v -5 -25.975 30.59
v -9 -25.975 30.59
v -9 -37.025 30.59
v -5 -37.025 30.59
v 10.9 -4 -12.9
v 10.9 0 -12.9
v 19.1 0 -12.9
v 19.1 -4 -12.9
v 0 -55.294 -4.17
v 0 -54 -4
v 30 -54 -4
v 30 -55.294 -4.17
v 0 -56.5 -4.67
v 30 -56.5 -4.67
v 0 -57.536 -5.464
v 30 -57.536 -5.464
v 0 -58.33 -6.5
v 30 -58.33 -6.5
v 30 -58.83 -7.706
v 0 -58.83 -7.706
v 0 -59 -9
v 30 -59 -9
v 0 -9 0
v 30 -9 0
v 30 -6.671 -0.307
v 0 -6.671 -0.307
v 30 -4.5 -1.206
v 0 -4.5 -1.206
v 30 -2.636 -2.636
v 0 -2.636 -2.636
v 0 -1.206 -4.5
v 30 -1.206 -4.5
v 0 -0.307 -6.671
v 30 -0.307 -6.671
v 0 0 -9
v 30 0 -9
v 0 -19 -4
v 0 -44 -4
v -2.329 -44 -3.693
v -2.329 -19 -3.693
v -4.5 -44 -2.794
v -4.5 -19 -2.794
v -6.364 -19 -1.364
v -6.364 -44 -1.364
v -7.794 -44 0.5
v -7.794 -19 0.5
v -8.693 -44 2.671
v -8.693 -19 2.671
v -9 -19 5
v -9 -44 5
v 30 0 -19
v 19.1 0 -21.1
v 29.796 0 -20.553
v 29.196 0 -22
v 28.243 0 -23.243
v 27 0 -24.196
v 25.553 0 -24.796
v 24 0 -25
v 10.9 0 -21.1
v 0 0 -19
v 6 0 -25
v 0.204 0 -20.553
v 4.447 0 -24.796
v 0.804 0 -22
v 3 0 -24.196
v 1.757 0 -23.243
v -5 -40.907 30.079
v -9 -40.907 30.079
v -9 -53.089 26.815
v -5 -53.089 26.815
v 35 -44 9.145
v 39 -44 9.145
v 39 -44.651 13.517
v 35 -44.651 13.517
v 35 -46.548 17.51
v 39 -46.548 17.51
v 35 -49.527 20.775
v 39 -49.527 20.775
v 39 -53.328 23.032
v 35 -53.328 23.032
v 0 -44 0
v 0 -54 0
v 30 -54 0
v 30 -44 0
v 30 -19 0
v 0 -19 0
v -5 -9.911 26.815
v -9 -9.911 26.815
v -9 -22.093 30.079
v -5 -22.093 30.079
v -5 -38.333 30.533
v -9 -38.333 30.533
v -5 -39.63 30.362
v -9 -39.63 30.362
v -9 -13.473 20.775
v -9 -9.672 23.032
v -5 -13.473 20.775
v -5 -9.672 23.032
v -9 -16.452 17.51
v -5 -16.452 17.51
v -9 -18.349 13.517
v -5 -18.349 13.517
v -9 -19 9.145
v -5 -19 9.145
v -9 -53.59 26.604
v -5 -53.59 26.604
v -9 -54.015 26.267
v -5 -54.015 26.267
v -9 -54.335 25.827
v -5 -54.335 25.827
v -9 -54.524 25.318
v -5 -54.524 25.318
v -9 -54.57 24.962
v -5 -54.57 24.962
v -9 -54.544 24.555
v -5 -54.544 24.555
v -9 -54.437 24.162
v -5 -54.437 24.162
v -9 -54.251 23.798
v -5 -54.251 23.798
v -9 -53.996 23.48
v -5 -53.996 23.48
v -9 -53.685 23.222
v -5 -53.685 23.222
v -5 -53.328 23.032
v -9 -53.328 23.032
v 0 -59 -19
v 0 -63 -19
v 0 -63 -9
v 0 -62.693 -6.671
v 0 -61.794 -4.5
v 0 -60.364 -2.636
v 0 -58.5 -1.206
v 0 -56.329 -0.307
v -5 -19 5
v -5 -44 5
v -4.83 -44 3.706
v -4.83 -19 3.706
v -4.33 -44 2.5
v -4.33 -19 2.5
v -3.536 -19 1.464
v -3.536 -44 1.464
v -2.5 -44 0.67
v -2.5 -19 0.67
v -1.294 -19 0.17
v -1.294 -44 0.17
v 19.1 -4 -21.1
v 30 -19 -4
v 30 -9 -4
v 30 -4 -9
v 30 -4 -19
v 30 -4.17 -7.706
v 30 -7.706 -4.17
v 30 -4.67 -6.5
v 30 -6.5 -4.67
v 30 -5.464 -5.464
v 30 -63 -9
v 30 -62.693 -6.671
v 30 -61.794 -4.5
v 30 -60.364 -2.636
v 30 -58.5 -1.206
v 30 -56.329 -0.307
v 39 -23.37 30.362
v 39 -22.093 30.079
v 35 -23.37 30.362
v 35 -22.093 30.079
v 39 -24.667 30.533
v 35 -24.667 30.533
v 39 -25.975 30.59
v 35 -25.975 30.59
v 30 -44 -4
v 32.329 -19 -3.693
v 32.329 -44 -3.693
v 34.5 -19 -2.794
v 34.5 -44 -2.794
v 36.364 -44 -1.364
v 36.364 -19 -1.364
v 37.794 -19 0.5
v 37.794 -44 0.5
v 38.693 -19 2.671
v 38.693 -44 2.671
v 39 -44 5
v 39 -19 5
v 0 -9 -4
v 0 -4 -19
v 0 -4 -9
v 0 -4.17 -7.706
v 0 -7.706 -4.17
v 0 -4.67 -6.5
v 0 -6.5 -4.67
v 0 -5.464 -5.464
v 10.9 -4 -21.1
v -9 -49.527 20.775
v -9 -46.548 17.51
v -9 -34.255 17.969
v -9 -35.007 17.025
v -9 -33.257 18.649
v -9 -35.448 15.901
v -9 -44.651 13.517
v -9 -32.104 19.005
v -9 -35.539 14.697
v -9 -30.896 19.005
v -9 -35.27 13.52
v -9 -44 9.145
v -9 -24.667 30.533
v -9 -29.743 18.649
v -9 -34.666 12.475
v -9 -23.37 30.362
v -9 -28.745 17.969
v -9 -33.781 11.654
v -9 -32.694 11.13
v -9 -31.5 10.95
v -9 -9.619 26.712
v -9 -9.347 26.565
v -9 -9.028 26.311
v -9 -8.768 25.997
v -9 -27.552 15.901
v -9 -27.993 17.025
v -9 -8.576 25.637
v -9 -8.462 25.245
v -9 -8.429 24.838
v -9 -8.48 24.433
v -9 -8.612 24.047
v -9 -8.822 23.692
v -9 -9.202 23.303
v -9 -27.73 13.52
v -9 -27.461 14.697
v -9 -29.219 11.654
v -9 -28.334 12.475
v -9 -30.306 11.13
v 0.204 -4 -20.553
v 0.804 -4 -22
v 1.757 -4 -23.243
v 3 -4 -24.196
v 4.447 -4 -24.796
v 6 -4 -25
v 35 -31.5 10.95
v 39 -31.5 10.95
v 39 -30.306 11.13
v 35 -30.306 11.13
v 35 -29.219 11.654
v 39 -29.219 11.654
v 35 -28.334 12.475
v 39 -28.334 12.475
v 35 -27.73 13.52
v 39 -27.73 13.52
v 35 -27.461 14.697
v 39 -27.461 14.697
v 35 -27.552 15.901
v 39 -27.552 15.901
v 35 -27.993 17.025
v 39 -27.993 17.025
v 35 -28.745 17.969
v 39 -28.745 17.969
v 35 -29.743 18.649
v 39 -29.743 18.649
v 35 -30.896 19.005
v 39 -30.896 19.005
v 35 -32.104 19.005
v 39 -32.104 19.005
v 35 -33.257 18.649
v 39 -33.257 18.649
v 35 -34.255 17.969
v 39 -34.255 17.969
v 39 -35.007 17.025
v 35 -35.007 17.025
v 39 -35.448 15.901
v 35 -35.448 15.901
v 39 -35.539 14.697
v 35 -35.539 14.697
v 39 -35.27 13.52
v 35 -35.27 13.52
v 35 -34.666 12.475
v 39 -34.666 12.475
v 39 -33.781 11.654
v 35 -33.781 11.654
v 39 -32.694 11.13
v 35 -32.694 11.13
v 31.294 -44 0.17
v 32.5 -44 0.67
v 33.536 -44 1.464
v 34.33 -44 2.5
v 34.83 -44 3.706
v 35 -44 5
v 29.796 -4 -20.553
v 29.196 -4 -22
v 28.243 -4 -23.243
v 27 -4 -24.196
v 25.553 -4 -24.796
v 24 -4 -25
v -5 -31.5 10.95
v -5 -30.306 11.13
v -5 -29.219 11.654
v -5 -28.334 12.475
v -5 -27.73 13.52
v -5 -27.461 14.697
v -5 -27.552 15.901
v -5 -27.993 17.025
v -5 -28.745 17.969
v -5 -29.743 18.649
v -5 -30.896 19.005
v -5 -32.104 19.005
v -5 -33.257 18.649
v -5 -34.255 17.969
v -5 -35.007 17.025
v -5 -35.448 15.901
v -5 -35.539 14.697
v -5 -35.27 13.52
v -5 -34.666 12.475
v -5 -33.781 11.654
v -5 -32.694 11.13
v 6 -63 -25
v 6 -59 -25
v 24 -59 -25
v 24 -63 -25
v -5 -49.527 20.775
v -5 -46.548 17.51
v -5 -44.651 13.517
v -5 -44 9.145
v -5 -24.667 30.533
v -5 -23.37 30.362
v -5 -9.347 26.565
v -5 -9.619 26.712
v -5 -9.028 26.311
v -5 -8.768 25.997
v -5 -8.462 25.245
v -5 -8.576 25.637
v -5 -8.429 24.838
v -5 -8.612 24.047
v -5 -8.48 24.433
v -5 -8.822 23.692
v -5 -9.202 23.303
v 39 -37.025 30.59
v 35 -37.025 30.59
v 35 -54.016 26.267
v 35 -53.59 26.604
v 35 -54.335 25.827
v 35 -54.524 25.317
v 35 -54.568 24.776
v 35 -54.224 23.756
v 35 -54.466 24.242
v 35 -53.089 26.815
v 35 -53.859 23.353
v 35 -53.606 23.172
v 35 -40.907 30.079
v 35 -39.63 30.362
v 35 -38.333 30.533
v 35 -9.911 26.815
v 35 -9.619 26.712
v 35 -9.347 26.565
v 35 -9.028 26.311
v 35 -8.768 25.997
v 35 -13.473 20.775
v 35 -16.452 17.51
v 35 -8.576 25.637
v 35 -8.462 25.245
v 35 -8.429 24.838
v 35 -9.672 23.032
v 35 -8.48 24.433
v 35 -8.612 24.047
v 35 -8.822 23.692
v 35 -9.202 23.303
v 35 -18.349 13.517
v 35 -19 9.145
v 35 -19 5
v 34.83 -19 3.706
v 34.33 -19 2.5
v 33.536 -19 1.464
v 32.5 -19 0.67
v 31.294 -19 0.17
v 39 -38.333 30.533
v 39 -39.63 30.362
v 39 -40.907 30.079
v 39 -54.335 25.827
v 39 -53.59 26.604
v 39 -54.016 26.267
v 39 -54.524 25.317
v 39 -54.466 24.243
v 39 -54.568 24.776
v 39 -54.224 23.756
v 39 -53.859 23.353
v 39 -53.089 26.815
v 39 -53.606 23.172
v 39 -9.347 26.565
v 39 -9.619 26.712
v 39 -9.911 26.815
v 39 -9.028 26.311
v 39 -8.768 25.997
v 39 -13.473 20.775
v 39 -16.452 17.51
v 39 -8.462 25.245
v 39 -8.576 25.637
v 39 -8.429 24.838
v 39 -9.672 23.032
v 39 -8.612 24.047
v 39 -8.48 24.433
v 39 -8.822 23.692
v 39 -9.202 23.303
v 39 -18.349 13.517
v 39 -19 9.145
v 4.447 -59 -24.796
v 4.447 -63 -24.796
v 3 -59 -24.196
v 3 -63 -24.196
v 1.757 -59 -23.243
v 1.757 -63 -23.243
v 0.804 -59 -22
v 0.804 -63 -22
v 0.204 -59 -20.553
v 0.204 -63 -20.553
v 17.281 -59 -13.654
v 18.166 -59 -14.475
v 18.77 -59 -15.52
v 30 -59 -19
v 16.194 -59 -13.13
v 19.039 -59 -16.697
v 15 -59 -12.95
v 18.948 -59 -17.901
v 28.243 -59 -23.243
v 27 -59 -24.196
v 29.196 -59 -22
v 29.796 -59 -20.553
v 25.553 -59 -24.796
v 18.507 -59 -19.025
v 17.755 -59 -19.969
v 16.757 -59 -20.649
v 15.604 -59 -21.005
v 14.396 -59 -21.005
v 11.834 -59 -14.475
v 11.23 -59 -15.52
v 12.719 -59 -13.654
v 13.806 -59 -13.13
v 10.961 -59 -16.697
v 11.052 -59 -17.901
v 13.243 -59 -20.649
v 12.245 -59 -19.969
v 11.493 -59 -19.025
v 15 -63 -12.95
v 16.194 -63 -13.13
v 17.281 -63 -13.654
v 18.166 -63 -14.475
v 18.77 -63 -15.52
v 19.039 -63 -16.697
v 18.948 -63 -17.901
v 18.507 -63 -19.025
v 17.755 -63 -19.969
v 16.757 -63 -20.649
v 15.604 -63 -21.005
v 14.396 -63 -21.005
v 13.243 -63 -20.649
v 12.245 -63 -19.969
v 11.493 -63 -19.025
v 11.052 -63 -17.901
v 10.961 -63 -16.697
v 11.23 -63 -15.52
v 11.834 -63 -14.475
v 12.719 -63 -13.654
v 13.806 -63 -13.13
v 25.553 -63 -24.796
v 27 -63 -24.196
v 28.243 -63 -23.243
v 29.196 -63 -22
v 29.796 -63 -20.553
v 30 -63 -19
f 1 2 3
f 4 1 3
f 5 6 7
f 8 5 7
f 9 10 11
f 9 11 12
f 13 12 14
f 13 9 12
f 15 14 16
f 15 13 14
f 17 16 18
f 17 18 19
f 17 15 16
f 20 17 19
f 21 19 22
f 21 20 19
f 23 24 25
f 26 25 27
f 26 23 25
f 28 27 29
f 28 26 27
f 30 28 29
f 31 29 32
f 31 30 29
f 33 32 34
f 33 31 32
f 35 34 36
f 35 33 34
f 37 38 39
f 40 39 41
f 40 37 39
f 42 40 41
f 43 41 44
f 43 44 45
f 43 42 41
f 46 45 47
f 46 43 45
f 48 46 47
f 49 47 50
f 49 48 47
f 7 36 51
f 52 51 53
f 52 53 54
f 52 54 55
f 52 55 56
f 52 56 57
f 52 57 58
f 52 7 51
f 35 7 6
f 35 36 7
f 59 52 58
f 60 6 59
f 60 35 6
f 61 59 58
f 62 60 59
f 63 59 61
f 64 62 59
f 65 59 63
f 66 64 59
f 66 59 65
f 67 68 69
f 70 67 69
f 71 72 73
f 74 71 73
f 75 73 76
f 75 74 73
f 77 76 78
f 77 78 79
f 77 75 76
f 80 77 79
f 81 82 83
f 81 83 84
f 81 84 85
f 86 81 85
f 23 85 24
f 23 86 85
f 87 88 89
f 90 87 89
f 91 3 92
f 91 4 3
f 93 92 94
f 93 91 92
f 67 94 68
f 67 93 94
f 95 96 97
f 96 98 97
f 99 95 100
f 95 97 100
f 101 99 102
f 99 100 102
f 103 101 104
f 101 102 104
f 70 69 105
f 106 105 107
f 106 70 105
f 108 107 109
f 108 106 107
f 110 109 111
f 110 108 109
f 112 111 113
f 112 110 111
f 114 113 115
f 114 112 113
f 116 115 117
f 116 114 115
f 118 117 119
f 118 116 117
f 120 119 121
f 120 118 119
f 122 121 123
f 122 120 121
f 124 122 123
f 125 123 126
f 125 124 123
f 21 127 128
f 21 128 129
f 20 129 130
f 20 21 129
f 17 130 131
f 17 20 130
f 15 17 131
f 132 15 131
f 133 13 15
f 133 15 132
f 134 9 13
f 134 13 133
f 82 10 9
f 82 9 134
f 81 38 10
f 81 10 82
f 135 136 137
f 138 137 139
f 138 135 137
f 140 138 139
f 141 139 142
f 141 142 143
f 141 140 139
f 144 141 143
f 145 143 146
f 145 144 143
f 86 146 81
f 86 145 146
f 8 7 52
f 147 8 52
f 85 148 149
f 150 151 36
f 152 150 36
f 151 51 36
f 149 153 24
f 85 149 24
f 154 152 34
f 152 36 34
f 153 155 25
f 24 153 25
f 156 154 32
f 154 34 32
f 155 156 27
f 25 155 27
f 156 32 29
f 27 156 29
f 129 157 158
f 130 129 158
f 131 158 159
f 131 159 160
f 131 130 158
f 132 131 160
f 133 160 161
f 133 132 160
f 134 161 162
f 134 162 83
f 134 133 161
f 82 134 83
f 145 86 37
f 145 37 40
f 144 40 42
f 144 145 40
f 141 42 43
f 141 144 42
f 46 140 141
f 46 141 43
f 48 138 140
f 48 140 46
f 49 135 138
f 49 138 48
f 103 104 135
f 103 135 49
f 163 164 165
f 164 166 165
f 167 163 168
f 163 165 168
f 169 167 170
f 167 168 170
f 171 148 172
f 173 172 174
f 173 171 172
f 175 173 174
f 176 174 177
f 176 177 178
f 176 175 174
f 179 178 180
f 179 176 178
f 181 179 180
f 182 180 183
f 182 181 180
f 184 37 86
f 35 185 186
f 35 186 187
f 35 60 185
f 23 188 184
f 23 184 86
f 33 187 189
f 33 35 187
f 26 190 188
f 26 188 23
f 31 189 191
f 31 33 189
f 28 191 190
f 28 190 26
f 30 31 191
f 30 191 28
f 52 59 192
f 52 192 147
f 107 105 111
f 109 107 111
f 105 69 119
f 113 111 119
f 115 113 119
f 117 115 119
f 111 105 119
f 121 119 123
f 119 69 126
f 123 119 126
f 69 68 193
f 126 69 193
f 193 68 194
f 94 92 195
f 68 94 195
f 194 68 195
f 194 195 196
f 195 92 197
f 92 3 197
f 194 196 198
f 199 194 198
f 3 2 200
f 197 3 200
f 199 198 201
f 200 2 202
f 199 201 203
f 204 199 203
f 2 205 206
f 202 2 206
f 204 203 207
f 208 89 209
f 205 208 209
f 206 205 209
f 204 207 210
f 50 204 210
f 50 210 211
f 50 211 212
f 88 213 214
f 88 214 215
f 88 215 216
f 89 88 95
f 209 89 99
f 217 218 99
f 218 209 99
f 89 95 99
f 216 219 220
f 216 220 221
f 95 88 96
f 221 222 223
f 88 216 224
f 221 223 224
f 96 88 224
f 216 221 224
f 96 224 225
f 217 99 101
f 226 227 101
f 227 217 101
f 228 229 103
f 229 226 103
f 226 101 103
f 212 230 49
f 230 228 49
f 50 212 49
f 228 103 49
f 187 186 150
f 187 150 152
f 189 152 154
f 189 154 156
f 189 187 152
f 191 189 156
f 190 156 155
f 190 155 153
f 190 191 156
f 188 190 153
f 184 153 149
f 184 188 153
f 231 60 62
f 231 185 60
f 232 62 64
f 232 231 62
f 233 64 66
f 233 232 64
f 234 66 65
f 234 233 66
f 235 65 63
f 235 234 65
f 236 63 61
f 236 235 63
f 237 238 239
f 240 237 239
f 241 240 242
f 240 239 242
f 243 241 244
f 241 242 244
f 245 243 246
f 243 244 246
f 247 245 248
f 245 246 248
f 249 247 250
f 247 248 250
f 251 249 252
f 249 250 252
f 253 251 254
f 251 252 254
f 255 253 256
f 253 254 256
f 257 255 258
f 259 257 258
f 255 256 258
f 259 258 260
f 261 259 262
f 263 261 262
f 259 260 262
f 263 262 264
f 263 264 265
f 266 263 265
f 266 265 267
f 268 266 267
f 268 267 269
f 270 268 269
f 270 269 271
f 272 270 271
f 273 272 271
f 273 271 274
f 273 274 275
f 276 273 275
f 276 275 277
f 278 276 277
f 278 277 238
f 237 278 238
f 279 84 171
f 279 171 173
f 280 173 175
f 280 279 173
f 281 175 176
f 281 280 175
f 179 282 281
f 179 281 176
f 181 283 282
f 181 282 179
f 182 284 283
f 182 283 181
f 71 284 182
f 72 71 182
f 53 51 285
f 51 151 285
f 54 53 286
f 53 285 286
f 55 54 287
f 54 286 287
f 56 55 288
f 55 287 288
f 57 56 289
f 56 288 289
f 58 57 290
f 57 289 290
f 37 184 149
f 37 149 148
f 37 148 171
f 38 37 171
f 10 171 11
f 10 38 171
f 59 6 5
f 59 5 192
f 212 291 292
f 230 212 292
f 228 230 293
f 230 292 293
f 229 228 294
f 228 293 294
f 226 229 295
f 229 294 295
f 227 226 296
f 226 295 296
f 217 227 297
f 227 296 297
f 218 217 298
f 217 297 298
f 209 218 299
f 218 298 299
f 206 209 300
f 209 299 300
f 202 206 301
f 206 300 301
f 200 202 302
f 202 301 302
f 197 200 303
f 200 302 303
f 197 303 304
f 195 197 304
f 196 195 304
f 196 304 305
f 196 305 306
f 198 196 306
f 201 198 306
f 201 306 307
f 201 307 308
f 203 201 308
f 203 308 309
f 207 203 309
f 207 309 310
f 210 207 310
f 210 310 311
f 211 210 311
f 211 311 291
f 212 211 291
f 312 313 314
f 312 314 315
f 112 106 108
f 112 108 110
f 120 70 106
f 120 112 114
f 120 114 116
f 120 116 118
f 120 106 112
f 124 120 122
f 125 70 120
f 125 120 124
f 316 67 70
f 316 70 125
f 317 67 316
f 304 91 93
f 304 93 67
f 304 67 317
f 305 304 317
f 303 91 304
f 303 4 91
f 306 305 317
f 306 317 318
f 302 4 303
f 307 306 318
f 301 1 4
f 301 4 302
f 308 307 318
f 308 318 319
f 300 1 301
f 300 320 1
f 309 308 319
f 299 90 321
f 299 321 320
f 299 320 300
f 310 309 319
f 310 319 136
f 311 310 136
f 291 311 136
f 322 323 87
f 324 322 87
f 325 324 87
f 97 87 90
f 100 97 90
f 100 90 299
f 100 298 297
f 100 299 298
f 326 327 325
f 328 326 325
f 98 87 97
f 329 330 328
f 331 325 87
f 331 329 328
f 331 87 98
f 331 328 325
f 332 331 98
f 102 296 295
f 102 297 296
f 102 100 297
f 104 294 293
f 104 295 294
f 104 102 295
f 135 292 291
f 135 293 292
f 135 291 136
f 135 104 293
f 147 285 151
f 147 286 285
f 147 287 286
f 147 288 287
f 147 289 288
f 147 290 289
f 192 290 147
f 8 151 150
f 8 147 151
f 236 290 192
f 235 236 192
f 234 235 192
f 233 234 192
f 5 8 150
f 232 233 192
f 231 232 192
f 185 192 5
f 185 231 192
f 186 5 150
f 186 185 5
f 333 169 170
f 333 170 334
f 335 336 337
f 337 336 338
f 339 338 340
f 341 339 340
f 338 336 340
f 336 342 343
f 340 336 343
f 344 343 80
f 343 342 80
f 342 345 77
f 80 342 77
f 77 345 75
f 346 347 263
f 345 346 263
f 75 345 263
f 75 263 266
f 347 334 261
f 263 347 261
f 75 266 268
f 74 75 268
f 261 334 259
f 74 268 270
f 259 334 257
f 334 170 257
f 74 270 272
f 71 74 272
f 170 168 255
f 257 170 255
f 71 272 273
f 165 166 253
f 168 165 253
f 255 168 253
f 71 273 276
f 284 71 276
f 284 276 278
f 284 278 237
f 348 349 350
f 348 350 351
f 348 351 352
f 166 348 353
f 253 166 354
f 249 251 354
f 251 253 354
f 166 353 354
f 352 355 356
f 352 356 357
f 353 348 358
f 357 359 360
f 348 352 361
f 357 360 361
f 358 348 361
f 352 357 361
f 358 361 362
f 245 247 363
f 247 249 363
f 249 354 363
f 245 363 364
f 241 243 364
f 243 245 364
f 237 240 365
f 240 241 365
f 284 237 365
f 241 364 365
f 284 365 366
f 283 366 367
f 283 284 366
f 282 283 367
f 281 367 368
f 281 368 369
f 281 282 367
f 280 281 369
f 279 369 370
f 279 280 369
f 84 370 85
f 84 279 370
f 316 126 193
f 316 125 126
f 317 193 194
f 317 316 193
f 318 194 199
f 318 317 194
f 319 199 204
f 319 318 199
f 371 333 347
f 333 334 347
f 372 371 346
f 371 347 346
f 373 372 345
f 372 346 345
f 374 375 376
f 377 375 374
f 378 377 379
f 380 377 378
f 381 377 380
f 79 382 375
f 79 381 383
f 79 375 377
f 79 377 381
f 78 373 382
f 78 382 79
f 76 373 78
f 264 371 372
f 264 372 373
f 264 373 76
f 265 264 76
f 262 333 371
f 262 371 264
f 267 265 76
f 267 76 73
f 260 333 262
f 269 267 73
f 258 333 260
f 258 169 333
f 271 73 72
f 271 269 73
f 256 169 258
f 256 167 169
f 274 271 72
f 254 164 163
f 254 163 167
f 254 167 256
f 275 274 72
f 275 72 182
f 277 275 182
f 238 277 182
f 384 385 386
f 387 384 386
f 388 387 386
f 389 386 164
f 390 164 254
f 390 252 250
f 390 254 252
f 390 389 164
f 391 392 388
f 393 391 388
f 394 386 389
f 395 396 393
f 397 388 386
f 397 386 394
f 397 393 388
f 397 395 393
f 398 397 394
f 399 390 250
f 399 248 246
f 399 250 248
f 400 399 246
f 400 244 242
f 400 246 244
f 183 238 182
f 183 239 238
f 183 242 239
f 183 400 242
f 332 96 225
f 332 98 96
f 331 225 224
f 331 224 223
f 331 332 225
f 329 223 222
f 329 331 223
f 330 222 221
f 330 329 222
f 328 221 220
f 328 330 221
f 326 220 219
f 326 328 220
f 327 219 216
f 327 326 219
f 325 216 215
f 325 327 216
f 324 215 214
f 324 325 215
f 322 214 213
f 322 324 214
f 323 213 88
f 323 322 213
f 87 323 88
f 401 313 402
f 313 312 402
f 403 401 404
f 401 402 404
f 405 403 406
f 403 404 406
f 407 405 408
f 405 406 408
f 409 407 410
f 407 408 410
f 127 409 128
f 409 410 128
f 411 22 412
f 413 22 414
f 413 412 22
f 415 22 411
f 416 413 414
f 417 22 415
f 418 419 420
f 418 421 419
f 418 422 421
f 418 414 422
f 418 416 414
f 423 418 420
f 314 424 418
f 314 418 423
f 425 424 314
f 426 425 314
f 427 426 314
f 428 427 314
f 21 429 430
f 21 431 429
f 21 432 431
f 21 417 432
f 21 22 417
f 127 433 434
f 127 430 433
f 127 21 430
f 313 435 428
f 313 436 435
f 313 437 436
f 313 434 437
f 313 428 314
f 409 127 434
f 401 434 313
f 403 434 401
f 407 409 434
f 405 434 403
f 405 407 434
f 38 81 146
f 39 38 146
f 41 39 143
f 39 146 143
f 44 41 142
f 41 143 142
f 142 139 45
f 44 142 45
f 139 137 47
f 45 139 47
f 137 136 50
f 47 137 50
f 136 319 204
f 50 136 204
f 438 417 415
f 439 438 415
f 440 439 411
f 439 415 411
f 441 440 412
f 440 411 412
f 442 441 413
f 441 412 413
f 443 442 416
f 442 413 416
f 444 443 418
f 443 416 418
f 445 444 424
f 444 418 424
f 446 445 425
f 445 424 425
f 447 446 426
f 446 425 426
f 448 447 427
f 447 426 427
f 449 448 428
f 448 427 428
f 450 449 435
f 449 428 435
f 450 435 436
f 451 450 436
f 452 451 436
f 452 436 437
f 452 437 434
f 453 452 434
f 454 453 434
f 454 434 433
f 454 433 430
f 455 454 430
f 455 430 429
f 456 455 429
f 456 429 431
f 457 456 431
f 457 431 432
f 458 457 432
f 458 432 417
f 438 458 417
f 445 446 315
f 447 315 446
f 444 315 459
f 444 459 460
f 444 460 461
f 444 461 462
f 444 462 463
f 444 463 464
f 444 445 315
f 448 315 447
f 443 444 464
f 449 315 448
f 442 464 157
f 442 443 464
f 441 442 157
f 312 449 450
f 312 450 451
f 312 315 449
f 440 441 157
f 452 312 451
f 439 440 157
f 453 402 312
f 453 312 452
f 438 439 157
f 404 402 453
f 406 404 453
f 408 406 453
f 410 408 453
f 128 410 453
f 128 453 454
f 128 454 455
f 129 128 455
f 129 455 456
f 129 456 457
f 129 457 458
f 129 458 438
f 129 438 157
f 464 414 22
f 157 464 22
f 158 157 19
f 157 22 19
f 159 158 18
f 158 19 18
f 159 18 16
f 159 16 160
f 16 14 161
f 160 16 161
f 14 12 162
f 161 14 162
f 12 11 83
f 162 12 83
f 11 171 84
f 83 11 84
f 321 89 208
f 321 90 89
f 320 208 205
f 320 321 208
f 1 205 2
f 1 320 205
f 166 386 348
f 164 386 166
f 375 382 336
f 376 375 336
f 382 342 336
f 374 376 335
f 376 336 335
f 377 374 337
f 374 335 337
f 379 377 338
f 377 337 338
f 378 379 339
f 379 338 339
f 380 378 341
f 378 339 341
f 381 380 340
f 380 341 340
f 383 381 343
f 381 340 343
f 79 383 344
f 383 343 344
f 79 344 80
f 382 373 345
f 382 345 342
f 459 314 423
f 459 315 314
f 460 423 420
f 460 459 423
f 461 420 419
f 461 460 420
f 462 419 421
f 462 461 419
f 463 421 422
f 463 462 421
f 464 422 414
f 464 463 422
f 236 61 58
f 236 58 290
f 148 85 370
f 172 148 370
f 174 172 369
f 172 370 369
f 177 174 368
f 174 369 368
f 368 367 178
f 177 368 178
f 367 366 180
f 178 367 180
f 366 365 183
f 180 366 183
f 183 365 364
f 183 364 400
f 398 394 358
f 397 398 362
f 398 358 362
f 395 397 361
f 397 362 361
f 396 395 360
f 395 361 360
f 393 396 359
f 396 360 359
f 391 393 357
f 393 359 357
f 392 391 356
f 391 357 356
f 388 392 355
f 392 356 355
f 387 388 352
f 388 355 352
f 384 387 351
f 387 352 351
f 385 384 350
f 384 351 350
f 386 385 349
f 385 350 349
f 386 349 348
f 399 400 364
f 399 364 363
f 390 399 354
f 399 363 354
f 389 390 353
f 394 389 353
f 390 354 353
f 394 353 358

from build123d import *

# Parameters (mm, degrees)
SM_BASE_FLANGE_1_DEPTH      = 30
SM_EDGE_FLANGE_1_DEPTH      = 25
SM_EDGE_FLANGE_1_BEND_DEPTH = 25
SKETCH_10_R                 = 4.05
CUT_EXTRUDE_1_DEPTH         = 79.198465458
SKETCH_11_R                 = 4.05
CUT_EXTRUDE_2_DEPTH         = 84.054199171
FILLET_1_R                  = 6
SKETCH_12_W                 = 8.2
SKETCH_12_H                 = 8.2
CUT_EXTRUDE_3_DEPTH         = 4
SM_BASE_FLANGE_1_2_DEPTH    = 4
SM_BASE_FLANGE_2_DEPTH      = 4
FILLET_2_R                  = 15
FILLET_3_R                  = 2


# Sheet-metal steps are written as plain solids
with BuildPart() as part:
    # Sketch 1 → Sm Base Flange 1 (new body)
    with BuildSketch(Plane(origin=(0, 0, 0), x_dir=(0, 0, -1), z_dir=(1, 0, 0))):
        with BuildLine():
            Line((25, -63), (9, -63))
            ThreePointArc((9, -63), (2.636038969, -60.363961031), (0, -54))
            Line((0, -54), (0, -9))
            ThreePointArc((0, -9), (2.636038969, -2.636038969), (9, 0))
            Line((9, 0), (25, 0))
            Line((25, 0), (25, -4))
            Line((25, -4), (9, -4))
            ThreePointArc((9, -4), (5.464466094, -5.464466094), (4, -9))
            Line((4, -9), (4, -54))
            ThreePointArc((4, -54), (5.464466094, -57.535533906), (9, -59))
            Line((9, -59), (25, -59))
            Line((25, -59), (25, -63))
        make_face()
    extrude(amount=SM_BASE_FLANGE_1_DEPTH)

    # Ребро-кромка1 section (across the edge) → Ребро-кромка1 (add)
    with BuildSketch(Plane(origin=(-5, -19, 0), x_dir=(1, 0, 0), z_dir=(0, -1, 0))):
        with BuildLine():
            Line((-4, 5), (-4, 25))
            Line((-4, 25), (0, 25))
            Line((0, 25), (0, 5))
            ThreePointArc((0, 5), (1.464466094, 1.464466094), (5, 0))
            Line((5, 0), (5, -4))
            ThreePointArc((5, -4), (-1.363961031, -1.363961031), (-4, 5))
        make_face()
    extrude(amount=SM_EDGE_FLANGE_1_DEPTH)

    # Ребро-кромка1 section 2 (across the edge) → Ребро-кромка1 bend (add)
    with BuildSketch(Plane(origin=(35, -44, 0), x_dir=(-1, 0, 0), z_dir=(0, 1, 0))):
        with BuildLine():
            Line((-4, 5), (-4, 25))
            Line((-4, 25), (0, 25))
            Line((0, 25), (0, 5))
            ThreePointArc((0, 5), (1.464466094, 1.464466094), (5, 0))
            Line((5, 0), (5, -4))
            ThreePointArc((5, -4), (-1.363961031, -1.363961031), (-4, 5))
        make_face()
    extrude(amount=SM_EDGE_FLANGE_1_BEND_DEPTH)

    # Эскиз10 → Вырез-Вытянуть1 (cut, through all)
    with BuildSketch(Plane(origin=(0, 0, 0), x_dir=(1, 0, 0), z_dir=(0, 1, 0))):
        with Locations(Location((15, 17, 0), (0, 0, 270))):
            Circle(SKETCH_10_R)
    extrude(amount=-CUT_EXTRUDE_1_DEPTH, mode=Mode.SUBTRACT)

    # Эскиз11 → Вырез-Вытянуть2 (cut, through all)
    with BuildSketch(Plane(origin=(39, 0, 0), x_dir=(0, 0, -1), z_dir=(1, 0, 0))):
        with Locations((-15, -31.5)):
            Circle(SKETCH_11_R)
    extrude(amount=-CUT_EXTRUDE_2_DEPTH, mode=Mode.SUBTRACT)

    # Скругление1
    fillet_1_edges = [part.edges().sort_by_distance(p)[0] for p in [
        (0, -61, -25),
        (0, -2, -25),
        (30, -61, -25),
        (30, -2, -25),
    ]]
    fillet(fillet_1_edges, radius=FILLET_1_R)

    # Эскиз12 → Вырез-Вытянуть3 (cut)
    with BuildSketch(Plane(origin=(0, 0, 0), x_dir=(1, 0, 0), z_dir=(0, 1, 0))):
        with Locations((15, 17)):
            Rectangle(SKETCH_12_W, SKETCH_12_H)
    extrude(amount=-CUT_EXTRUDE_3_DEPTH, mode=Mode.SUBTRACT)

    # Эскиз13 → Sm Base Flange 1 2 (add)
    with BuildSketch(Plane(origin=(39, 0, 0), x_dir=(0, 0, -1), z_dir=(1, 0, 0))):
        Polygon((-25, -19), (-23.891346313, 1), (-30.590076124, -24), (-30.590076124, -39), (-23.891346313, -64), (-25, -44), align=None)
    extrude(amount=-SM_BASE_FLANGE_1_2_DEPTH)

    # Эскиз14 → Выступ2 (add)
    with BuildSketch(Plane.ZY.offset(9)):
        Polygon((25, -19), (23.891346313, 1), (30.590076124, -24), (30.590076124, -39), (23.891346313, -64), (25, -44), align=None)
    extrude(amount=-SM_BASE_FLANGE_2_DEPTH)

    # Скругление2
    fillet_2_edges = [part.edges().sort_by_distance(p)[0] for p in [
        (37, -39, 30.590076124),
        (37, -24, 30.590076124),
        (-7, -24, 30.590076124),
        (-7, -39, 30.590076124),
        (-7, -19, 25),
        (-7, -44, 25),
        (37, -44, 25),
        (37, -19, 25),
    ]]
    fillet(fillet_2_edges, radius=FILLET_2_R)

    # Скругление3
    fillet_3_edges = [part.edges().sort_by_distance(p)[0] for p in [
        (-7, -64, 23.891346313),
        (37, -64, 23.891346313),
        (37, 1, 23.891346313),
        (-7, 1, 23.891346313),
    ]]
    fillet(fillet_3_edges, radius=FILLET_3_R)


solid = part.part
